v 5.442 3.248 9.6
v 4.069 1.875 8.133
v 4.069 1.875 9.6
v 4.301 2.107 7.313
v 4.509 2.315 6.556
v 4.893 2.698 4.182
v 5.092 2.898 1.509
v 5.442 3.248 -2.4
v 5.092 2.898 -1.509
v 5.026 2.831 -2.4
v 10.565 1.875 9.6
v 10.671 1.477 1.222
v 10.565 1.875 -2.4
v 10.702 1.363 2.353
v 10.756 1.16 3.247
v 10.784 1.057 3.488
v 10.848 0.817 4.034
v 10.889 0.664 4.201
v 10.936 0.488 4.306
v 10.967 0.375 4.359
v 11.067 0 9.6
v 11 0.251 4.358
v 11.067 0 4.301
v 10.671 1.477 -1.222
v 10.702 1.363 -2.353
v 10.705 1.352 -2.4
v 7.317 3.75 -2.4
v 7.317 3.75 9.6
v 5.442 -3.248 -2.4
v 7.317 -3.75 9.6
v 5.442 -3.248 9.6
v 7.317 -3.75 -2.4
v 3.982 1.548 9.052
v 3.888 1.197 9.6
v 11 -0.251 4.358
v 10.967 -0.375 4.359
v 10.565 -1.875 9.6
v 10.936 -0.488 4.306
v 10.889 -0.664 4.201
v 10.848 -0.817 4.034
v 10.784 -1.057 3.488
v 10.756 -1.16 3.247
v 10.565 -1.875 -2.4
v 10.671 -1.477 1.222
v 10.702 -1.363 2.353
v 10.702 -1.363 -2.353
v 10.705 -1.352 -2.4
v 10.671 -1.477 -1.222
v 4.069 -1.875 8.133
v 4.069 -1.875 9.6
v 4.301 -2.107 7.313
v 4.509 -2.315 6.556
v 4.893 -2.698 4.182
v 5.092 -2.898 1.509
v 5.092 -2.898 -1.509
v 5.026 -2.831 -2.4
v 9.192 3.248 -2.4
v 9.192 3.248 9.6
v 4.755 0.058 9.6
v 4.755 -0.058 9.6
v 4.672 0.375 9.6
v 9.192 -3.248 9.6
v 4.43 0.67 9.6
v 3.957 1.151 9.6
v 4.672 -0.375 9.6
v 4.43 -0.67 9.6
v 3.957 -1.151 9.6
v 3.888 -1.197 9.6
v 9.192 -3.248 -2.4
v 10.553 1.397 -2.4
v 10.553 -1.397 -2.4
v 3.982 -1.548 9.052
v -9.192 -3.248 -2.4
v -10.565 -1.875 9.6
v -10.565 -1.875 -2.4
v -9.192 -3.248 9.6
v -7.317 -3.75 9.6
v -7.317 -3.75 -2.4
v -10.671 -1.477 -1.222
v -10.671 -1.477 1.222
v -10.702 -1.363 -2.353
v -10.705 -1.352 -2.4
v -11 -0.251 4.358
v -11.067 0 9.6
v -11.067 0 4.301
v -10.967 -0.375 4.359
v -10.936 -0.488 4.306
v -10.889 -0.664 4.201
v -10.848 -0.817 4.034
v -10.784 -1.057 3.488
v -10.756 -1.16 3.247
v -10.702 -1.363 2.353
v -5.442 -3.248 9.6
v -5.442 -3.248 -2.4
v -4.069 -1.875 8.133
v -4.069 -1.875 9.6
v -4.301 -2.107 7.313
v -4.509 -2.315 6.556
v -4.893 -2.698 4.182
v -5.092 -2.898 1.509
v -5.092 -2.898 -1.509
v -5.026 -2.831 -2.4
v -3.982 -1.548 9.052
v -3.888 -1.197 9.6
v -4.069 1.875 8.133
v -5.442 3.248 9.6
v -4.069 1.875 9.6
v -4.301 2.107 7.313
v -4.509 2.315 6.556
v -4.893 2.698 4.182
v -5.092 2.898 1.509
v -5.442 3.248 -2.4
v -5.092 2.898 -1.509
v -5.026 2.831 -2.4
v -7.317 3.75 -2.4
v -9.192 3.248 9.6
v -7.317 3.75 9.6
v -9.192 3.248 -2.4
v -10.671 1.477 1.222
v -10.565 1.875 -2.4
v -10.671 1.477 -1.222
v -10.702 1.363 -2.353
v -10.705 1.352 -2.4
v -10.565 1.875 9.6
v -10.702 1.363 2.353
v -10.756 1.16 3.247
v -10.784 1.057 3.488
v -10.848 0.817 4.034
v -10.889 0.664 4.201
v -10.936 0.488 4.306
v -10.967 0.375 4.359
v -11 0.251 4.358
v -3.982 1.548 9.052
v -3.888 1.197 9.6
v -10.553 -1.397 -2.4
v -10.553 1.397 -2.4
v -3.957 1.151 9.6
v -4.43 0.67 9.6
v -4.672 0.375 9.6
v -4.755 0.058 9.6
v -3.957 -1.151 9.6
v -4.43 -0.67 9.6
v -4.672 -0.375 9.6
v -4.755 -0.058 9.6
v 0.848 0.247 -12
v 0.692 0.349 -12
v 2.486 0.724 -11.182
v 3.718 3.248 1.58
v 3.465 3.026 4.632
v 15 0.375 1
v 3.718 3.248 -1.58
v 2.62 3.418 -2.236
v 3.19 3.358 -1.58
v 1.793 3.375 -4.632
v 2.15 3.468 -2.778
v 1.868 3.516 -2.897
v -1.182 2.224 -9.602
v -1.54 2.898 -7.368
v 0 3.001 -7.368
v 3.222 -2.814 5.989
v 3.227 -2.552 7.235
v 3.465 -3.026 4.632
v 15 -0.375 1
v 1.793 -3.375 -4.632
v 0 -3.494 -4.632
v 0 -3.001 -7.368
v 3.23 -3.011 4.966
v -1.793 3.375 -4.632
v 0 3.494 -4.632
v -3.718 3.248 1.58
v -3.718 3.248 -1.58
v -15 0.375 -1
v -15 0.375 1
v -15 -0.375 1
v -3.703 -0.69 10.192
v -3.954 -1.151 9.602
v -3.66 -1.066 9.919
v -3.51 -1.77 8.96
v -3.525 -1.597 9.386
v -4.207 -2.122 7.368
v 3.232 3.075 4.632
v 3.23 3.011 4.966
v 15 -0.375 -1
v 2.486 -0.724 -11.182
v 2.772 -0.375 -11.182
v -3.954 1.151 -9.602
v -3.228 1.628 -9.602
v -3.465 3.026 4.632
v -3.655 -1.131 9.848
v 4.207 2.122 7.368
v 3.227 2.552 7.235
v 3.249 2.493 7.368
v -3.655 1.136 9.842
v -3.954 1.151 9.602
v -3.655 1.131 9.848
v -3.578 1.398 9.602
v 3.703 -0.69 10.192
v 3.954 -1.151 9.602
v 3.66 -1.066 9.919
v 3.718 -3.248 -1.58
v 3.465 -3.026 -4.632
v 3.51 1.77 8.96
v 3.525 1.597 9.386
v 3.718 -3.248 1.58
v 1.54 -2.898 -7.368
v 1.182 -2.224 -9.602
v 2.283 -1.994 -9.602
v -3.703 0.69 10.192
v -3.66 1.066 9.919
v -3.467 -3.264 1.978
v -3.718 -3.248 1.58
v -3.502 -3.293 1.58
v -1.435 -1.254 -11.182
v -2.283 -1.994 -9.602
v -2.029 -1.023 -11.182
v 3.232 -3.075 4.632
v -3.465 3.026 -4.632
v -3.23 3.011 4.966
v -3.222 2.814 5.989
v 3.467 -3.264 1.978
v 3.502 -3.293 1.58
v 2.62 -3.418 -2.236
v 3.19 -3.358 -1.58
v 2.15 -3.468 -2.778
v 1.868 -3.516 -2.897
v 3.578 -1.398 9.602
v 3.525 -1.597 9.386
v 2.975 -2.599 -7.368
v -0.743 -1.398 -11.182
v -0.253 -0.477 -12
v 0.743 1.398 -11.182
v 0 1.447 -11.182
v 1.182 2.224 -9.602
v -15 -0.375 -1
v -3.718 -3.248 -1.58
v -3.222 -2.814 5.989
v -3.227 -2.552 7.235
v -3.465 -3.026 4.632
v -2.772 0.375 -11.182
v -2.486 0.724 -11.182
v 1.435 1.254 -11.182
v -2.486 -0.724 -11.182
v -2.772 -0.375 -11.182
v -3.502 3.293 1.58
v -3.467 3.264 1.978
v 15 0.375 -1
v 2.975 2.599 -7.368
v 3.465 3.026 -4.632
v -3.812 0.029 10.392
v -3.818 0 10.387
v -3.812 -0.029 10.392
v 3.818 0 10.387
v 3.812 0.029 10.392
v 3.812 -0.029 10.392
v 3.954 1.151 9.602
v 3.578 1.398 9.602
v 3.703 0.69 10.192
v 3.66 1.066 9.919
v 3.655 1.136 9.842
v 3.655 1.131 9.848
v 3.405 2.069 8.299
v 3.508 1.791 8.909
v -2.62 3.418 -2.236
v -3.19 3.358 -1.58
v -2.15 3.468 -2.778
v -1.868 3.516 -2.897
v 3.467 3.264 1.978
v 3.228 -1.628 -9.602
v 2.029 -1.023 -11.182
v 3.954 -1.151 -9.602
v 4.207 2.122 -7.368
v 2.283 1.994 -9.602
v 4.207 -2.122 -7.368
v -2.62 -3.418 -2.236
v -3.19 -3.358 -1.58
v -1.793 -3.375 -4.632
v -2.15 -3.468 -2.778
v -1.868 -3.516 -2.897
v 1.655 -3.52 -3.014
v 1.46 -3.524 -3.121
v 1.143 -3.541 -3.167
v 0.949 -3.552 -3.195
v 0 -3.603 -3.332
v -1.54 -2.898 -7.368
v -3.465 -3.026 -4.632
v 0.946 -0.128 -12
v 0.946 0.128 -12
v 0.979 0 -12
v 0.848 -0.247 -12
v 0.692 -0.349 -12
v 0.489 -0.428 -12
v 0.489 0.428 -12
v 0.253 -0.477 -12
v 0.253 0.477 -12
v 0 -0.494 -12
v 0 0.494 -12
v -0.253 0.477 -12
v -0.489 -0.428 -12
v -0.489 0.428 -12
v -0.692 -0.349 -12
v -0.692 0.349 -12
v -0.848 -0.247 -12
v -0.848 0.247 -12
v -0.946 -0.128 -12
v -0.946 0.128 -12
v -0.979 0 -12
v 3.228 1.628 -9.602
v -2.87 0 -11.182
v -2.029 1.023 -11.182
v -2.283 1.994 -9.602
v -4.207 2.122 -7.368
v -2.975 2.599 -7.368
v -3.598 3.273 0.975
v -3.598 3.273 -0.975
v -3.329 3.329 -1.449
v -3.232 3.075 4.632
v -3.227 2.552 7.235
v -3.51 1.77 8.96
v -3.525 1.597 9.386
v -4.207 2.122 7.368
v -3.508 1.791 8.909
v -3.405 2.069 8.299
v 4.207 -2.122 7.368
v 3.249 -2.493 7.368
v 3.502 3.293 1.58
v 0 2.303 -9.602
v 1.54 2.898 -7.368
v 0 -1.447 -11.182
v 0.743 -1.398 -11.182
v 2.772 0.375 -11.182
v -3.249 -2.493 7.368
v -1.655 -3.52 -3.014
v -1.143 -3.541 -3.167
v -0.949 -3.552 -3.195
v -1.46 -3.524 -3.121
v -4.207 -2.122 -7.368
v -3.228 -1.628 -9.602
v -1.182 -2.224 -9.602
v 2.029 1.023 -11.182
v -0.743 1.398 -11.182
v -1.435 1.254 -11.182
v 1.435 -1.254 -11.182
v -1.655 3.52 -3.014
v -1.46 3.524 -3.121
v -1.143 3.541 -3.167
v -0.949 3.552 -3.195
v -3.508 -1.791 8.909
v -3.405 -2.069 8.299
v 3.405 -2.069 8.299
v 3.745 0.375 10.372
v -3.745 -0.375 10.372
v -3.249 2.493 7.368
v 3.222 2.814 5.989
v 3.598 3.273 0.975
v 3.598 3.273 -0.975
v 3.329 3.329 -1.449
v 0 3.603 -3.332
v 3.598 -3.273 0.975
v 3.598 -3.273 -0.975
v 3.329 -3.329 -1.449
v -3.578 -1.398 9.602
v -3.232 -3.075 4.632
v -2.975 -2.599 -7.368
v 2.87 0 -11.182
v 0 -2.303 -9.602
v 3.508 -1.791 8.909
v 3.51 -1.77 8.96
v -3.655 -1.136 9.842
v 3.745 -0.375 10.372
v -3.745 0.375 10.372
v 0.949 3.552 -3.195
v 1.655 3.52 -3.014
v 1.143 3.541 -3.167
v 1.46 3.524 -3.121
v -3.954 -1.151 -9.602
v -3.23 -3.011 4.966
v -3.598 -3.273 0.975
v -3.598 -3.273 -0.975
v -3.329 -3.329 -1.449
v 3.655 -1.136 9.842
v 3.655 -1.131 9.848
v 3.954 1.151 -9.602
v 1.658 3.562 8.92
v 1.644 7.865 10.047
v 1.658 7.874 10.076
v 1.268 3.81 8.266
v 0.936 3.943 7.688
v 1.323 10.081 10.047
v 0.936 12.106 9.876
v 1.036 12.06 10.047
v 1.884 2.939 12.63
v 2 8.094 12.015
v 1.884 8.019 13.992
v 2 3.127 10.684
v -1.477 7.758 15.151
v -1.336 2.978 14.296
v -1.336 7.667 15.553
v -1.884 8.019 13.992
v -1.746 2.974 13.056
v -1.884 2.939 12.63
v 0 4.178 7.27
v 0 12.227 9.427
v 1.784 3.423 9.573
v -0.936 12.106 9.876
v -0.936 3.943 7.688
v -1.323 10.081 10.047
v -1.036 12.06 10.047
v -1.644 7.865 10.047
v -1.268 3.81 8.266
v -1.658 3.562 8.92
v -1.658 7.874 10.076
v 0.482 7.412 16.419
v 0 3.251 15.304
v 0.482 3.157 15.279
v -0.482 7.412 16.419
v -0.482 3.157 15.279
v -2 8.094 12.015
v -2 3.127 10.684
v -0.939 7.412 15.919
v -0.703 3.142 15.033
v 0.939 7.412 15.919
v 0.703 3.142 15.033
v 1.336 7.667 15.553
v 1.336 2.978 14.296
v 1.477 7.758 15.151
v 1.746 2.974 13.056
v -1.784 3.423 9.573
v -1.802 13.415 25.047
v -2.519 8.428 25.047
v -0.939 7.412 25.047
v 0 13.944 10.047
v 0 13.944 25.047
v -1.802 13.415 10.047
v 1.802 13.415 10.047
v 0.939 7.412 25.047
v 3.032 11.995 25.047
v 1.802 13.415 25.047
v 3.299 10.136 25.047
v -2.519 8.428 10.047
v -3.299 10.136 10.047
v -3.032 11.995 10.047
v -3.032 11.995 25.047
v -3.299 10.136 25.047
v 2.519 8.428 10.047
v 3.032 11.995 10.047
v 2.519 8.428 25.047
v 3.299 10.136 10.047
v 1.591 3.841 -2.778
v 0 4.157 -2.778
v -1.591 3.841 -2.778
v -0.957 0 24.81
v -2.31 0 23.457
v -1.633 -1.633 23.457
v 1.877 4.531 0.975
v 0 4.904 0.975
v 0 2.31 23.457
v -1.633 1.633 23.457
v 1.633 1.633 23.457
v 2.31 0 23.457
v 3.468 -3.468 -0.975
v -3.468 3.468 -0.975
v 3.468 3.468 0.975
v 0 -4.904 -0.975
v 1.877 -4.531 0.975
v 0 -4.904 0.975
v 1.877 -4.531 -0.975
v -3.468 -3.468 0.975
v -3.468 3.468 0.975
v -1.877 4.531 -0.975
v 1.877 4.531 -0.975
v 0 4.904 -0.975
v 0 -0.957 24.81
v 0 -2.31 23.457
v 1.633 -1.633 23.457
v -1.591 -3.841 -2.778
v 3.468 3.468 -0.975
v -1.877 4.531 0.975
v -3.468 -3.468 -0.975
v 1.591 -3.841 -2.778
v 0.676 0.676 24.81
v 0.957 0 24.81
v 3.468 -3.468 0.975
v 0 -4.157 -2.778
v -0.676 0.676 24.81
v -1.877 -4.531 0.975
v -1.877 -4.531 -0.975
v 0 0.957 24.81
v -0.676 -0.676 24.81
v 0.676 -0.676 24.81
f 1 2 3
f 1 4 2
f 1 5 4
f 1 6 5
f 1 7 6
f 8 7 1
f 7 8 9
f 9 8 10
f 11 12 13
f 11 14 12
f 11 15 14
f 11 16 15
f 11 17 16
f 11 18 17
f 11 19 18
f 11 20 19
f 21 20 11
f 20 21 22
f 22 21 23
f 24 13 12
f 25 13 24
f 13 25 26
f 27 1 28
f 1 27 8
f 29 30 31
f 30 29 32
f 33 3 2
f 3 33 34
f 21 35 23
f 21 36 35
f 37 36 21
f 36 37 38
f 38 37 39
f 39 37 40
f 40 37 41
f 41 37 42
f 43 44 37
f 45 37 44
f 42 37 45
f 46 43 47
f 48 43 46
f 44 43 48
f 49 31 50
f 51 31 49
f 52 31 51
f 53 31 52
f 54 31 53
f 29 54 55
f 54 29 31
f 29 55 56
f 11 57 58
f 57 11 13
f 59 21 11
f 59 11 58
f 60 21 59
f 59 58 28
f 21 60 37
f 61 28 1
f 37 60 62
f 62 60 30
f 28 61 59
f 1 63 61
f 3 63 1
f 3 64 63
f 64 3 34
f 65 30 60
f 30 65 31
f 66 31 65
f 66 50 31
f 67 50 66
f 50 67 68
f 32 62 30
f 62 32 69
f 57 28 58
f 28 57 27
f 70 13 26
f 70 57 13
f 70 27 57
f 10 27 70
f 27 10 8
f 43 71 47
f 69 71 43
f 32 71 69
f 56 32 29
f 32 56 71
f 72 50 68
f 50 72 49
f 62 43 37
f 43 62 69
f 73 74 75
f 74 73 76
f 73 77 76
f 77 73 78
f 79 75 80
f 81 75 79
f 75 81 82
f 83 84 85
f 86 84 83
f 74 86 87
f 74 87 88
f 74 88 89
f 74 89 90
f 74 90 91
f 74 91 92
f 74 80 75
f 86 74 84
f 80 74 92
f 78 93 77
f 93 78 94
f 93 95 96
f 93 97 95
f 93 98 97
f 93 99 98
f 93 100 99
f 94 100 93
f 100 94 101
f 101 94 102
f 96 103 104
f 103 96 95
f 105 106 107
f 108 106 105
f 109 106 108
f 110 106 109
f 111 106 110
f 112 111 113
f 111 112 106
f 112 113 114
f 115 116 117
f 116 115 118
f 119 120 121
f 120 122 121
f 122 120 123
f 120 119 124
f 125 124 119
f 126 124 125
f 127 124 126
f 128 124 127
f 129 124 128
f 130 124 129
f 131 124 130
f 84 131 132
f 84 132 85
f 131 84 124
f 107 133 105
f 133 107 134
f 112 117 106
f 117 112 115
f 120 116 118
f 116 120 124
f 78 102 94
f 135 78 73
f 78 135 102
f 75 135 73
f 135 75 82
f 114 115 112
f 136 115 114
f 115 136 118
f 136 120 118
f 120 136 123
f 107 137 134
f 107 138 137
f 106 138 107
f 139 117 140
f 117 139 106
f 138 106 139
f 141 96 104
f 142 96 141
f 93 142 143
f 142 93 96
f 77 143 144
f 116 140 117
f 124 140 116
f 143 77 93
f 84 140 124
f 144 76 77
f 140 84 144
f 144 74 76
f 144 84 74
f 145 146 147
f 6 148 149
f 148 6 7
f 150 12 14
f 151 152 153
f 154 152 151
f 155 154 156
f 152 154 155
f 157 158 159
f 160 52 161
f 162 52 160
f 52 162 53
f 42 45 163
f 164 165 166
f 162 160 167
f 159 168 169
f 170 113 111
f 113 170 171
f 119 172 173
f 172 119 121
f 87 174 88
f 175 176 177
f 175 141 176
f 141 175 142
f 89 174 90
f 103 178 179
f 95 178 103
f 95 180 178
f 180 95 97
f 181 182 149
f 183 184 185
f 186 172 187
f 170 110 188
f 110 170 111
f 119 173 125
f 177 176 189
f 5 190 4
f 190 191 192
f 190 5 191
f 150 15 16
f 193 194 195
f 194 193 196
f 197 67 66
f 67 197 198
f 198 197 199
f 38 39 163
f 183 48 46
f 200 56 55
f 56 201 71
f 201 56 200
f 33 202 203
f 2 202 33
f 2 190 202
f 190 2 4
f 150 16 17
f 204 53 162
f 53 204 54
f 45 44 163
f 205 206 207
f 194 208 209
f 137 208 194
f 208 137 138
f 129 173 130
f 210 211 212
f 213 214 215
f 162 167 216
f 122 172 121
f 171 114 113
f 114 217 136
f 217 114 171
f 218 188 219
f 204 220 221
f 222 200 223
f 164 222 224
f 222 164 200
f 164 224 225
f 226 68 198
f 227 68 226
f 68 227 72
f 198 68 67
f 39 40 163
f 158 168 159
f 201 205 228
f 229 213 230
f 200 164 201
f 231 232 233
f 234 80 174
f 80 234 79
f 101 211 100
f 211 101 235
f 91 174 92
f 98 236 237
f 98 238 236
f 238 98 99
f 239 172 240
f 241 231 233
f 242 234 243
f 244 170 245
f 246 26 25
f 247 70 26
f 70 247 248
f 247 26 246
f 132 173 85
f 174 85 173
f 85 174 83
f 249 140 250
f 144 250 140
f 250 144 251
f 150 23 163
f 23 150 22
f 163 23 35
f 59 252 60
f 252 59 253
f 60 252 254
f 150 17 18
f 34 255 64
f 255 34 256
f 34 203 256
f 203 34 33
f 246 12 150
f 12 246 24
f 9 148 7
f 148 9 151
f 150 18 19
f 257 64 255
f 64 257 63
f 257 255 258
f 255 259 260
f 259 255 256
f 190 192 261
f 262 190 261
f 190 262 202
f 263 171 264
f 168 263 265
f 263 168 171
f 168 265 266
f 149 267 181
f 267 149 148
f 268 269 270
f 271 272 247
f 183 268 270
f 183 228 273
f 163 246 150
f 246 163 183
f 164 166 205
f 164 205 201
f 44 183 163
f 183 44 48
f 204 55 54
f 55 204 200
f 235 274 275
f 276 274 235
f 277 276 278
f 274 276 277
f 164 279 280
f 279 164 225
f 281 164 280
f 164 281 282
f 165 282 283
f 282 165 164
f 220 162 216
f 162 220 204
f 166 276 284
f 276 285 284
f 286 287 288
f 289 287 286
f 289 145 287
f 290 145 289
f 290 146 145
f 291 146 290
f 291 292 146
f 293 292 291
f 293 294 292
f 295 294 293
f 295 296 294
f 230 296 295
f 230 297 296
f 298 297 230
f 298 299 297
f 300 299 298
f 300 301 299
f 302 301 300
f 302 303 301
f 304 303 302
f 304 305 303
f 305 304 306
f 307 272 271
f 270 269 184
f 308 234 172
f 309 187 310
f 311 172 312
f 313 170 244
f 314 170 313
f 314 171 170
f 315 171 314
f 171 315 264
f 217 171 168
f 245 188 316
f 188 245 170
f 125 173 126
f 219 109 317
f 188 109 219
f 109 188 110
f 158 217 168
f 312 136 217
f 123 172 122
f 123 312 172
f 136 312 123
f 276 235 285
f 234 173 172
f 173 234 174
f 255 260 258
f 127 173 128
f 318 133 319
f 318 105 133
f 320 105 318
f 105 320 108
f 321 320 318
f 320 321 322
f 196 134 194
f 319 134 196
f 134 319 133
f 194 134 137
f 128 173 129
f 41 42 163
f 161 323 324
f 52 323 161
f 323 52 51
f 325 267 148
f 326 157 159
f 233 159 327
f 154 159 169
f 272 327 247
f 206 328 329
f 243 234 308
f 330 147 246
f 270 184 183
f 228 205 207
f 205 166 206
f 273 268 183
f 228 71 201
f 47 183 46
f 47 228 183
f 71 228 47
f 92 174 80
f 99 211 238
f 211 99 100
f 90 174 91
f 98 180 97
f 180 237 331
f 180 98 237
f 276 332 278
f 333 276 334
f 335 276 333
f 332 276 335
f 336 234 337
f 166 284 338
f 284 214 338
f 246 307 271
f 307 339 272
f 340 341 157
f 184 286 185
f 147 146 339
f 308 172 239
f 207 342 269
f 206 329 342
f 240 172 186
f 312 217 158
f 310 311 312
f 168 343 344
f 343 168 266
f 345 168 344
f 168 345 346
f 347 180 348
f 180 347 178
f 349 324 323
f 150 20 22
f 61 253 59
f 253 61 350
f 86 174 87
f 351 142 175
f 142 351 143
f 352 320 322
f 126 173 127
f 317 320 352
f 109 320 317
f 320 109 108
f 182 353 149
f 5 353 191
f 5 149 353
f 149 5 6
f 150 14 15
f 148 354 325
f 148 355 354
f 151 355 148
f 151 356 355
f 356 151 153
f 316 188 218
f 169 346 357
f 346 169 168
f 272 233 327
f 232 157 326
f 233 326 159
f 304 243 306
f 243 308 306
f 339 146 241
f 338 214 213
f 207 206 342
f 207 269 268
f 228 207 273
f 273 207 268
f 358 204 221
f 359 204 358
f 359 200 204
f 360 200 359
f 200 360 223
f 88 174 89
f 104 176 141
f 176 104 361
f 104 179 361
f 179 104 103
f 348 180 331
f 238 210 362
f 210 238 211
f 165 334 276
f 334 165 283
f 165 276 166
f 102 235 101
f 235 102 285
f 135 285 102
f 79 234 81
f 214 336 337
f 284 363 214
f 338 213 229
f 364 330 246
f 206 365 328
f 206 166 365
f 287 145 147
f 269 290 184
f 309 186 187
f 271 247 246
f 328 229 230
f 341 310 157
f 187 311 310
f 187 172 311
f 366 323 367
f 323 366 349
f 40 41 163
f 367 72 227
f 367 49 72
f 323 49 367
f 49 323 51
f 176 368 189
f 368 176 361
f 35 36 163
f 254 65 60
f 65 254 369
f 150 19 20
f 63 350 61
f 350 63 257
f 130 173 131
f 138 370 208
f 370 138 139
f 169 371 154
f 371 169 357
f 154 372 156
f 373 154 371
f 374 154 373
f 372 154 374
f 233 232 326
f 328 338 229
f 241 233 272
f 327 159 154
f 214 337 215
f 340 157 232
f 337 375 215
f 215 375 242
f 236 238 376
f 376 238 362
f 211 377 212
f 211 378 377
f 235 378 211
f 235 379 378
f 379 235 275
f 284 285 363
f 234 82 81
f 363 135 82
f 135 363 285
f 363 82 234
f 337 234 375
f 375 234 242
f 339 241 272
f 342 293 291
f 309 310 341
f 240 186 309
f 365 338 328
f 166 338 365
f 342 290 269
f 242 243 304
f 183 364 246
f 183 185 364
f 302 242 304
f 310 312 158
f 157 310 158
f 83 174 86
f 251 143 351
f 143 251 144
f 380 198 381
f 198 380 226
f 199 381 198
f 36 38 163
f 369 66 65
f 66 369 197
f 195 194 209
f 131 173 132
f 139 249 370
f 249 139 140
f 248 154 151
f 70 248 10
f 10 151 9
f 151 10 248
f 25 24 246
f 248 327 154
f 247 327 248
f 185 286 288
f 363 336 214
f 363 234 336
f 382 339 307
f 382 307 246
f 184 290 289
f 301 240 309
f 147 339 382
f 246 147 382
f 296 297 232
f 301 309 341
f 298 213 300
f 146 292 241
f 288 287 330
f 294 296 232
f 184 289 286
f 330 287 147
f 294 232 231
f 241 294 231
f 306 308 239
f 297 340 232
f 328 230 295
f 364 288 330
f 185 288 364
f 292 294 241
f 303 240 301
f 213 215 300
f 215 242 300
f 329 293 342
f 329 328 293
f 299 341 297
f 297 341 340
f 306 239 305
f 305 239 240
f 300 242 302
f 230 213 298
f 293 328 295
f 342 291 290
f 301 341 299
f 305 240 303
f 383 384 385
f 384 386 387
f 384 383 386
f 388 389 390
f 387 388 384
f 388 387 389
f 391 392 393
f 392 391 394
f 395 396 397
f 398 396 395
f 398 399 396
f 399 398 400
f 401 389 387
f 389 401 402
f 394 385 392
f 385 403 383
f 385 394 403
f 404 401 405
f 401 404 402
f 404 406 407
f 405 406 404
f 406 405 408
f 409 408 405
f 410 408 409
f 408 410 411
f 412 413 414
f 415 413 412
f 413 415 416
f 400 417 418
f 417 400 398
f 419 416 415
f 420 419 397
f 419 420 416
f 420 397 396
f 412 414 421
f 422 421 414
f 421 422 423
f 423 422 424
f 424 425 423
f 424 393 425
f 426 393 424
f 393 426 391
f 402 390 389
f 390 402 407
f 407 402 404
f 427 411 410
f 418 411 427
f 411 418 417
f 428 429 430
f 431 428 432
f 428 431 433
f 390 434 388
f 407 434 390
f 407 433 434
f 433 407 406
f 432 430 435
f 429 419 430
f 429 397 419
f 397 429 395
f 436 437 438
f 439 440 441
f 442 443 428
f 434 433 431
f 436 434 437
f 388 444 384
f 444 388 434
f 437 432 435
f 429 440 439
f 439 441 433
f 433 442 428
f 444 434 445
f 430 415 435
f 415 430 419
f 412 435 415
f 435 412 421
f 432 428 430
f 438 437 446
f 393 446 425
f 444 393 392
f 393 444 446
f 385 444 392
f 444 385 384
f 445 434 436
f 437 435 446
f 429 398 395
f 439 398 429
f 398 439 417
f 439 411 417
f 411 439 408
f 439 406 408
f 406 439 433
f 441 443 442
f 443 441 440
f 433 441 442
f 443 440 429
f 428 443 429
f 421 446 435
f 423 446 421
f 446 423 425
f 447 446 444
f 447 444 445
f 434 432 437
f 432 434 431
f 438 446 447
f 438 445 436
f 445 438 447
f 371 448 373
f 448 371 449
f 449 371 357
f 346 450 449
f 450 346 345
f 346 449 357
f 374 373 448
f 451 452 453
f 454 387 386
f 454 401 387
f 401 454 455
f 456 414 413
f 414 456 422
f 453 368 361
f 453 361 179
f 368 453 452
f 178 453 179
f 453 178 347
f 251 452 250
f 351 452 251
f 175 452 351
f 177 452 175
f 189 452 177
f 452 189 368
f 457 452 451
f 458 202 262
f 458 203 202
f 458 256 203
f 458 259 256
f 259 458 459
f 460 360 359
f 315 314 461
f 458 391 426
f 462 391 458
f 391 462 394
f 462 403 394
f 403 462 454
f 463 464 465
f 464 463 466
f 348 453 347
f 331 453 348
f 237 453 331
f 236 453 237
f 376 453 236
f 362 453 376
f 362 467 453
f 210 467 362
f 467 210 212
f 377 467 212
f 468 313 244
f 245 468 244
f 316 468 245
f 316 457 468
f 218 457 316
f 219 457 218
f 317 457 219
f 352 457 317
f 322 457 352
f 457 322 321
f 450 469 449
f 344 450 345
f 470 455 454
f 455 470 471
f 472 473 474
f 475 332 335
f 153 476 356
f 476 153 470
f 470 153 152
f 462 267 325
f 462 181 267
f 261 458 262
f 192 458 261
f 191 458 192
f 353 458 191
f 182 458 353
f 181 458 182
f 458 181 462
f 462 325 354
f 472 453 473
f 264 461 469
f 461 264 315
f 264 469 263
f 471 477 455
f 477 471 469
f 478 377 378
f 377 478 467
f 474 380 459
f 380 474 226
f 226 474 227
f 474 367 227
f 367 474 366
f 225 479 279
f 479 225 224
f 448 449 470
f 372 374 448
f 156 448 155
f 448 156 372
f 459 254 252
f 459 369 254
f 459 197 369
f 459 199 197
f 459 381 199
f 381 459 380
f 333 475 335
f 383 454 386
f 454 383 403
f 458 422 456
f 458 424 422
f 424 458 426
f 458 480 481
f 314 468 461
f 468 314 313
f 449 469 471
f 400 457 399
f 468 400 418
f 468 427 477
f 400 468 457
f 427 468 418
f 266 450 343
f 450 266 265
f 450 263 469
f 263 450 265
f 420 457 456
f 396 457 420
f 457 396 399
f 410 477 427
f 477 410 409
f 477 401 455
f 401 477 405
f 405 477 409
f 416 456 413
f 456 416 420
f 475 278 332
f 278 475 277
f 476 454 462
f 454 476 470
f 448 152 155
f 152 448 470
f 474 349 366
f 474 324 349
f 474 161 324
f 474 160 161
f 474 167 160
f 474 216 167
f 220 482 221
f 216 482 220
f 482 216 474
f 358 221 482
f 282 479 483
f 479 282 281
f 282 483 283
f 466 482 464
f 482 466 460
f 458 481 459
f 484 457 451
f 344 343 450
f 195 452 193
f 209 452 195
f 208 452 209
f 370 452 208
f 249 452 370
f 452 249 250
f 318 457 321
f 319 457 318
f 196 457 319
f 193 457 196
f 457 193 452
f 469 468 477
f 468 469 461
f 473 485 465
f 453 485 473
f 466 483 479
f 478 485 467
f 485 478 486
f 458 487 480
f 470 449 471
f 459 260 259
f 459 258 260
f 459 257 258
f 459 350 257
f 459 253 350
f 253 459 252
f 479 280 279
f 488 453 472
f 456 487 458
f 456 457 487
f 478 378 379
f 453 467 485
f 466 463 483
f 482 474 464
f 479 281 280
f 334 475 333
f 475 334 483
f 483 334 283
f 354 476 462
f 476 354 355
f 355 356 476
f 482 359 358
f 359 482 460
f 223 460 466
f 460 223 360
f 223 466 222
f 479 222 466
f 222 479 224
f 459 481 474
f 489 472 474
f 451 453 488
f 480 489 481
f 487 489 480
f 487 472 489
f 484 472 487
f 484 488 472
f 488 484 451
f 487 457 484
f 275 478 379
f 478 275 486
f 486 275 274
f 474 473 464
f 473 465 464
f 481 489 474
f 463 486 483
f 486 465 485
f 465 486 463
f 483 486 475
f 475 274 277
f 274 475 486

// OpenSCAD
/*
p = number of pylons
r = main body radius
l = length
a = wing/pylon sweep 0-40 deg
re = engine radius
*/
//radialType(7, 8, 17, 0, 3);
module radialType(p, r, l, a, re) {
	//body
	hull() {
		sphere(r);
		translate([0, 0, l-1.5*r]) sphere(r/2);
	}
	//pylons
	for (i=[0:p]) {
		rotate([0, -a, i*(360/p)])
            translate([(r/2)-1, 0, l/3])
                enginePylon(a, l/2, re);
	}
}

module enginePylon(a, l, r) {
	//translate([0, -2, 0]) cube([l, 4, 8], false);
	resize(newsize=[0.85*l, 4, 8]) rotate([0, 90, 0]) cylinder(0.85*l, 4, 4,false);
	rotate([0, a, 0]) translate([0.85*l-1, 0, a/2]) engine(r, l);
}

module engine(r, l) {
	cylinder(l, r, r, true);
}

module HybridType(d, e) {
    union() {
        deltaType(d, d/4, 1.25, .5, 0);
        rotate([0, 0, 45]) radialType(e, d/6, d, 12, d/(2*e));
        }
    }
    HybridType2(30, 3);
    
    module HybridType2(d, e) {
    union() {
        deltaType(d, d/4, 1.25, .5, e-1);
        rotate([0, 0, 90]) radialType(1, d/6, d, 15, d/(3*e));
        }
    }

//deltaType(130, 15, 1.75, .65, 13);
/*
s= span
t= thickness
a= aspect ratio (0<x)
sw= wing sweep (0-1)
e= number of engines
*/
module deltaType(s, t, a, sw, e) {
	//body
	l = s/a;
	hull() {
		resize(newsize=[0, t, l]) sphere(t);
		//"wings"
		translate([0, 0, l*(sw-.5)]) cube([s, t/10, 2], true);
	}
	//engines
	r = s/(2*e);
	if (floor(e/2) != ceil(e/2)) translate([0, 0, l/3]) engine(r, l/3);
	for (i=[0:1]) {
		for (k=[1:1:(e/2)]) {
			rotate([0, 0, i*(180)]) 
				translate([k*s/(2.05*e), 0, (+l/2)-(k/(e+1))*2.1*(1-sw)*l]) 
					engine(min(t/2,(k+1)*r/(2*k)), l/2);
		}
	}
}

module displayShips(s, sp) {
// display code
for (i=[0.9:0.16:2]) {
	for (k=[0.25:0.15:0.75]) {
		for (j=[1:1:7]) {
			translate([sp*(i-0.9)*10*s, (sp*j)*s, -sp*(0.25-k)*10*s]) deltaType(s, s/4, i, k, j);
		}
	}
}

for (i=[5:5:35]) {
	for (k=[10:5:25]) {
		for (j=[2:7]) {
			translate([sp*(i-5)*30, -sp*(j-1)*150, -sp*(10-k)*30]) radialType(j, k, s, i);
		}
	}
}
}

//displayShips(100, 2);
